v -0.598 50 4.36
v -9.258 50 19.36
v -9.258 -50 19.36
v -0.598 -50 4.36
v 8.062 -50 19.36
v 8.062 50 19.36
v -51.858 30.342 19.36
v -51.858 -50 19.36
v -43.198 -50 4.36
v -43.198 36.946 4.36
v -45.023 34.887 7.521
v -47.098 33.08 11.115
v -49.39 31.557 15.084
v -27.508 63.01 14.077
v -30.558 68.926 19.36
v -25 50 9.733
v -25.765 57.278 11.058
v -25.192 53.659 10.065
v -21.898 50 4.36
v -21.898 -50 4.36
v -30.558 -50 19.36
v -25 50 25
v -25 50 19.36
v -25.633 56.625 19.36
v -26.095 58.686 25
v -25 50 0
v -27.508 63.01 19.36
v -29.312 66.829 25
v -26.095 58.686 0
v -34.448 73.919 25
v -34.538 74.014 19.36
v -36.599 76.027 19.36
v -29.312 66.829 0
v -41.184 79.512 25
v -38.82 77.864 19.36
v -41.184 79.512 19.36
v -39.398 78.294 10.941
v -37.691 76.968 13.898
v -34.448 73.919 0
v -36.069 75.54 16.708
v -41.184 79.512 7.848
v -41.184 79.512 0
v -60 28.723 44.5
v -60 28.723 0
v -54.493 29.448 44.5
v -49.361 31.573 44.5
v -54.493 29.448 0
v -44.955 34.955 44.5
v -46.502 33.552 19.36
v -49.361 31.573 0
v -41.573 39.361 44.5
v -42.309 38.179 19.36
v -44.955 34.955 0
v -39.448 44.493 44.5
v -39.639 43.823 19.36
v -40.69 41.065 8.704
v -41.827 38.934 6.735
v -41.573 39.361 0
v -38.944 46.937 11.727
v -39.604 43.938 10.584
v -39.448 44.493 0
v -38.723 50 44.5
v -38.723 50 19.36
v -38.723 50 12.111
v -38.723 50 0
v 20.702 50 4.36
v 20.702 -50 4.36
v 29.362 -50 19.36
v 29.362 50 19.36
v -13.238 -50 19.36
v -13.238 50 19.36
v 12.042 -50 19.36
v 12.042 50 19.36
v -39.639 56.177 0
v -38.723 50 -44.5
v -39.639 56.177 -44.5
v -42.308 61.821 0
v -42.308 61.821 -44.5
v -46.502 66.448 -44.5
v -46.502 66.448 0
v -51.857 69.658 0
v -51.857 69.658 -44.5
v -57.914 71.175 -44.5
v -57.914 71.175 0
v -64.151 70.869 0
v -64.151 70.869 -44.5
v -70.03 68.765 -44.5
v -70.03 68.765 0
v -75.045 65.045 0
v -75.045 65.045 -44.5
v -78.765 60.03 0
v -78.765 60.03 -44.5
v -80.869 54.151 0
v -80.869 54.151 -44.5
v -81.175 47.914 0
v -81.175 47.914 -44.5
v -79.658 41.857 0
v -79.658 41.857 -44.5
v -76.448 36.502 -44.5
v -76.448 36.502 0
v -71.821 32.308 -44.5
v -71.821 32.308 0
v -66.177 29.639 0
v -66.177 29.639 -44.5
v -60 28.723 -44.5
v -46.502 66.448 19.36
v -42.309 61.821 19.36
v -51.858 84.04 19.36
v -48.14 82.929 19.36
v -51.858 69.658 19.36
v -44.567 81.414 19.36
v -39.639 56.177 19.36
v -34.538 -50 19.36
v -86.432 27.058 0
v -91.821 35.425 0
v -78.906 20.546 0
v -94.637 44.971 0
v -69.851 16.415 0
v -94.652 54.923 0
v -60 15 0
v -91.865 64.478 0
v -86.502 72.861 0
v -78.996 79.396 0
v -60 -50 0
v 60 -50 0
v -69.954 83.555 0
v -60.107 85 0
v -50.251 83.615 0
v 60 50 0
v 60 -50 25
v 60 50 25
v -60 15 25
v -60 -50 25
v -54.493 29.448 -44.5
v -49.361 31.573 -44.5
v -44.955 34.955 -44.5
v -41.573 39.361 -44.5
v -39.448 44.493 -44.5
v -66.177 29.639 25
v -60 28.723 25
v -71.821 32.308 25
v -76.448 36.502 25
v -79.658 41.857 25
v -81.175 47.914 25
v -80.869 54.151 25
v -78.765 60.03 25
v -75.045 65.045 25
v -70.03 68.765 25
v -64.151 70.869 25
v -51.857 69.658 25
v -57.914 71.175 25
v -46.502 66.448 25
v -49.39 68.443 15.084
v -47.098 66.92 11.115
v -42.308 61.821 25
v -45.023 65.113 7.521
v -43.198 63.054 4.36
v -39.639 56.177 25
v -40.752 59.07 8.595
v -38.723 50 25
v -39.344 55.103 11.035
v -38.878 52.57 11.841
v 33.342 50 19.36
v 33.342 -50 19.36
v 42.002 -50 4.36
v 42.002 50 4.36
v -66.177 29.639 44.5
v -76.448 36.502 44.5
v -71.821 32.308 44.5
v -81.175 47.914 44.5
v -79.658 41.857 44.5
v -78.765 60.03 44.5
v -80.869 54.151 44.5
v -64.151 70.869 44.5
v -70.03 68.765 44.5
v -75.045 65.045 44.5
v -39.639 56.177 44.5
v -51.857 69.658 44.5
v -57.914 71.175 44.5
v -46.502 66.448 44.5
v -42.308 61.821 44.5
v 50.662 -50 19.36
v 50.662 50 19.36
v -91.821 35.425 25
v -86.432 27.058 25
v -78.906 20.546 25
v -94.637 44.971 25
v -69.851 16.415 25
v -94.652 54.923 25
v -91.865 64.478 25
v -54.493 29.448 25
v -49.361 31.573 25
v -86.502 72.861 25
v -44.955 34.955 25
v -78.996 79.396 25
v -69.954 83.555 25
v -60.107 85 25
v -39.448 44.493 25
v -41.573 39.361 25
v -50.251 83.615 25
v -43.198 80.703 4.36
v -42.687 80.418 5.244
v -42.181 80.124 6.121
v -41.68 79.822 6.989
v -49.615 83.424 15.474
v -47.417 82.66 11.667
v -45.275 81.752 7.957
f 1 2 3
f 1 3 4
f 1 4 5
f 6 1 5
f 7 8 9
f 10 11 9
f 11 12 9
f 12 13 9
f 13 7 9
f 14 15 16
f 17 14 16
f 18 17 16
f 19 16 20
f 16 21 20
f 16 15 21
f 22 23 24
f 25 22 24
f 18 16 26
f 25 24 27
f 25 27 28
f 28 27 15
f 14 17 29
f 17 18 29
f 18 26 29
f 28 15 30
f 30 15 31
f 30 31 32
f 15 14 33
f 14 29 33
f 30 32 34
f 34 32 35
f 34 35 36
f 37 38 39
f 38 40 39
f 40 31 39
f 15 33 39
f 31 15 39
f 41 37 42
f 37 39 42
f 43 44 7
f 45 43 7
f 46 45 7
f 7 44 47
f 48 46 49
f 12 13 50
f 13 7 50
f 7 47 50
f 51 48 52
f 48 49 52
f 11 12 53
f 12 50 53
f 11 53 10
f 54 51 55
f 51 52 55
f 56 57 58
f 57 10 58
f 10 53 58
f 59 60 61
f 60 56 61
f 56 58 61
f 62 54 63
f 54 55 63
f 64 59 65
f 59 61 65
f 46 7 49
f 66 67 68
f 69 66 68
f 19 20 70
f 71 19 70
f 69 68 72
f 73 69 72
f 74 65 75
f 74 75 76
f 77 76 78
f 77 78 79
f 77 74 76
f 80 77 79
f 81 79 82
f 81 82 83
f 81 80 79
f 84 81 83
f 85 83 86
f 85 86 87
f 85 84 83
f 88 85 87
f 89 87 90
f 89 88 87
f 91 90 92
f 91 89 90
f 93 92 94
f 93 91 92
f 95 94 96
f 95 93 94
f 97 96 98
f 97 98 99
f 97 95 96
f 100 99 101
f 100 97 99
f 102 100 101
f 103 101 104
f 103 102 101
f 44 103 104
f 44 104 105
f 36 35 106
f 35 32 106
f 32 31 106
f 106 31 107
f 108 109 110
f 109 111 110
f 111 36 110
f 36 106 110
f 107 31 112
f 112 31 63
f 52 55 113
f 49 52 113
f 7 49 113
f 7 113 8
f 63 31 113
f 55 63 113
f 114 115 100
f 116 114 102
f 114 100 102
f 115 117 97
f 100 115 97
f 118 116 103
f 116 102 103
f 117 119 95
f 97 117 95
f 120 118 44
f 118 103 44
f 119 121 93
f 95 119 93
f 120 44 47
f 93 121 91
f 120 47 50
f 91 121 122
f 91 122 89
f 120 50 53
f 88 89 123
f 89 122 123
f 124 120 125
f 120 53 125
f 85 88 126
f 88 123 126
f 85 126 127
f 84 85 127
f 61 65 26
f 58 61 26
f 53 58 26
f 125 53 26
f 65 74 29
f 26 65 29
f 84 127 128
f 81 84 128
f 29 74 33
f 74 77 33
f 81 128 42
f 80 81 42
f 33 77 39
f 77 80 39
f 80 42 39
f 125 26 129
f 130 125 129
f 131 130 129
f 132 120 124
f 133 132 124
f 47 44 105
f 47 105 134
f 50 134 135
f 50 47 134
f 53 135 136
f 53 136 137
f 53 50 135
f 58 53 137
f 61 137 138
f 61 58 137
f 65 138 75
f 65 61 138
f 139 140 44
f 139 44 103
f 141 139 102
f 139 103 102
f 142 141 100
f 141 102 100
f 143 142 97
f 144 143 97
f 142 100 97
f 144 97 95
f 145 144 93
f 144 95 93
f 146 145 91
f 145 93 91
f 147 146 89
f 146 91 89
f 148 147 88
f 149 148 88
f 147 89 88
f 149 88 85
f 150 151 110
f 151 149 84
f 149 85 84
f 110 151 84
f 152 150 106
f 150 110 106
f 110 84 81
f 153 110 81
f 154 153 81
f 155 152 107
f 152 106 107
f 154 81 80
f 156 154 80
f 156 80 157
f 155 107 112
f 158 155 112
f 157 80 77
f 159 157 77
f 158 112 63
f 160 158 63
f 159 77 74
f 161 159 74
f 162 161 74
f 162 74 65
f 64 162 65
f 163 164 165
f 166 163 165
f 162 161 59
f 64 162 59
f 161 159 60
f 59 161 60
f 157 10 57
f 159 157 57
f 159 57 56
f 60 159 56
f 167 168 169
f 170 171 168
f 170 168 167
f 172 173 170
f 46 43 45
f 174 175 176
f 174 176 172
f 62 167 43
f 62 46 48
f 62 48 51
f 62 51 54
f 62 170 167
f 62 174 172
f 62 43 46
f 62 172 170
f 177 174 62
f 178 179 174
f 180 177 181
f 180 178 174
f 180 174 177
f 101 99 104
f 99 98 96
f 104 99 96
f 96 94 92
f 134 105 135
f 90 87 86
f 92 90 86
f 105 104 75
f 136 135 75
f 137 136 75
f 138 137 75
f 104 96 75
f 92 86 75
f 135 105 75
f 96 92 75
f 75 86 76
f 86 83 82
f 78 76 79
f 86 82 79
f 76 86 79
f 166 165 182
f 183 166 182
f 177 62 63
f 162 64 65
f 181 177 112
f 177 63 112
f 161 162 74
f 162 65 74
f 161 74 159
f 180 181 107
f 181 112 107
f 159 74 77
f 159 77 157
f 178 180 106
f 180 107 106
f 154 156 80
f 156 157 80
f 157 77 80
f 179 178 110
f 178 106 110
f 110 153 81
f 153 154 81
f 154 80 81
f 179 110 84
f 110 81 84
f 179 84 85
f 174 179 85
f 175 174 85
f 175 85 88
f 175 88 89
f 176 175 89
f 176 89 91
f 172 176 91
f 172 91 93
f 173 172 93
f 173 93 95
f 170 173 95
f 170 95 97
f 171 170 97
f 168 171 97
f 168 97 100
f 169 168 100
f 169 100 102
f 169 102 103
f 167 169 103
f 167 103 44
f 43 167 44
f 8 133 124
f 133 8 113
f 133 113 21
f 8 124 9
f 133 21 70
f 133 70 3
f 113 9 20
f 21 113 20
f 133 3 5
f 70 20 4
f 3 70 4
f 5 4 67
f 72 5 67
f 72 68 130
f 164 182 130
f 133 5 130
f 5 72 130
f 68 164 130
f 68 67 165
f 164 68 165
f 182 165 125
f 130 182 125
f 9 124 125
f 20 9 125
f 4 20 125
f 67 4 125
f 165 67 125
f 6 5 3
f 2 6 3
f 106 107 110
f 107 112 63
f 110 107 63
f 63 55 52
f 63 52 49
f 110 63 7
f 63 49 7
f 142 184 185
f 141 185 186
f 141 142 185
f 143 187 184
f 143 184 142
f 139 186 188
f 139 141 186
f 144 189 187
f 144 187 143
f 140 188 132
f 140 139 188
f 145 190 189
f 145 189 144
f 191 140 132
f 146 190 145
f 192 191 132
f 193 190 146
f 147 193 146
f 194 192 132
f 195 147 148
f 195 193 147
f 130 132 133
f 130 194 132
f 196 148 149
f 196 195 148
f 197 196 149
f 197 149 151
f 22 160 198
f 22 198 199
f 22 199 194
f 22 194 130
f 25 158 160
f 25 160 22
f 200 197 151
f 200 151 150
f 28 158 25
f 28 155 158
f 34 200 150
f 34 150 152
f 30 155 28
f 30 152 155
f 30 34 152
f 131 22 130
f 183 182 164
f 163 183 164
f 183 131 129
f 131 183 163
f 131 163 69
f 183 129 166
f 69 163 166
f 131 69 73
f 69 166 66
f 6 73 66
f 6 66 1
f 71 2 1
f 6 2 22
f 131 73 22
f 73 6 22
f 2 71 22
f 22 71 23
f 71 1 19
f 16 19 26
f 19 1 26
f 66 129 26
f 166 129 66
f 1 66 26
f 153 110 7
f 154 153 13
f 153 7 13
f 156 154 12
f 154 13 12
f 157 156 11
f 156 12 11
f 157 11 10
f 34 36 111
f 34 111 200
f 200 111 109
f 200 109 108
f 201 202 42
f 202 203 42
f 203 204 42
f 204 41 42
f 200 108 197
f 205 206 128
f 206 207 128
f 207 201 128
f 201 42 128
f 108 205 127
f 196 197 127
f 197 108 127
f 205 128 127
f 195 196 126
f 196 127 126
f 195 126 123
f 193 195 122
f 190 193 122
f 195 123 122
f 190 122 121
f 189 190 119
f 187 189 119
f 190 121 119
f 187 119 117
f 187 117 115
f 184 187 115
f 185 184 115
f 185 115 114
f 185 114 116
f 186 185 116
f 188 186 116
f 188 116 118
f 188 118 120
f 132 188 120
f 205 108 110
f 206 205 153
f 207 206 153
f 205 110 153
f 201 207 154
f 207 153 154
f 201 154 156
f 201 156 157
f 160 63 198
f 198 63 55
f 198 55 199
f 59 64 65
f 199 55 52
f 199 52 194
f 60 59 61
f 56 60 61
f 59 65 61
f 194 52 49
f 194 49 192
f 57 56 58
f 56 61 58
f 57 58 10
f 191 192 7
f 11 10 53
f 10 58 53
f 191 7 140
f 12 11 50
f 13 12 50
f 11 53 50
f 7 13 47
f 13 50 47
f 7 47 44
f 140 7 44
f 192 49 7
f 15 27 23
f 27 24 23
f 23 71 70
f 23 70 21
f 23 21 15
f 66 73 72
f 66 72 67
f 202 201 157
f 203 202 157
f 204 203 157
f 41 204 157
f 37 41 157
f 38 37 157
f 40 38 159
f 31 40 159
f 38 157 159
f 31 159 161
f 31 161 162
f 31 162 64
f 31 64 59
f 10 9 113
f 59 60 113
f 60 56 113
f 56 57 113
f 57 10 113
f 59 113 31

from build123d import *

# Parameters (mm, degrees)
F1_DEPTH = 25
F2_DEPTH = 44.5
F4_DEPTH = 135.001


with BuildPart() as f1:
    # F0 (on Top) → F1 (new body)
    with BuildSketch(Plane.XY):
        with BuildLine():
            ThreePointArc((-41.184, 79.512), (-93.6, 59.8), (-60, 15))
            Line((-60, 15), (-60, 28.7225588989))
            ThreePointArc((-60, 28.7225588989), (-75.0454228889, 65.0454228889), (-38.7225588989, 50))
            Line((-38.7225588989, 50), (-25, 50))
            ThreePointArc((-25, 50), (-29.3115656965, 66.8291413922), (-41.184, 79.512))
        make_face()
        with BuildLine():
            Line((-60, -50), (60, -50))
            Line((60, -50), (60, 50))
            Line((60, 50), (-25, 50))
            ThreePointArc((-25, 50), (-35.2512626585, 25.2512626585), (-60, 15))
            Line((-60, 15), (-60, -50))
        make_face()
        with BuildLine():
            Line((-60, 28.7225588989), (-60, 15))
            ThreePointArc((-60, 15), (-35.2512626585, 25.2512626585), (-25, 50))
            Line((-25, 50), (-38.7225588989, 50))
            ThreePointArc((-38.7225588989, 50), (-44.9545771111, 34.9545771111), (-60, 28.7225588989))
        make_face()
    extrude(amount=F1_DEPTH)


with BuildPart() as f2:
    # F0 (on Top) → F2 (new body, symmetric)
    with BuildSketch(Plane.XY):
        with BuildLine():
            ThreePointArc((-38.7225588989, 50), (-75.0454228889, 65.0454228889), (-60, 28.7225588989))
            Line((-60, 28.7225588989), (-60, 50))
            Line((-60, 50), (-38.7225588989, 50))
        make_face()
        with BuildLine():
            Line((-60, 50), (-60, 28.7225588989))
            ThreePointArc((-60, 28.7225588989), (-44.9545771111, 34.9545771111), (-38.7225588989, 50))
            Line((-38.7225588989, 50), (-60, 50))
        make_face()
    extrude(amount=F2_DEPTH, both=True)


with BuildPart() as f4_tool:
    # F3 (on face) → F4 (new body, through all)
    with BuildSketch(Plane.XZ.offset(50)):
        Polygon((-43.197884396, 4.3595845481), (-34.5376303581, 19.3595845481), (-51.8581384338, 19.3595845481), align=None)
        Polygon((-21.897884396, 4.3595845481), (-13.2376303581, 19.3595845481), (-30.5581384338, 19.3595845481), align=None)
        Polygon((-0.597884396, 4.3595845481), (8.0623696419, 19.3595845481), (-9.2581384338, 19.3595845481), align=None)
        Polygon((20.702115604, 4.3595845481), (29.3623696419, 19.3595845481), (12.0418615662, 19.3595845481), align=None)
        Polygon((42.002115604, 4.3595845481), (50.6623696419, 19.3595845481), (33.3418615662, 19.3595845481), align=None)
    extrude(amount=-F4_DEPTH)


with BuildPart() as f1_1:
    add(f1.part)

    # F4: cut by f4_tool
    add(f4_tool.part, mode=Mode.SUBTRACT)


with BuildPart() as f2_1:
    add(f2.part)

    # F4: cut by f4_tool
    add(f4_tool.part, mode=Mode.SUBTRACT)


solid = Compound([f1_1.part, f2_1.part])
